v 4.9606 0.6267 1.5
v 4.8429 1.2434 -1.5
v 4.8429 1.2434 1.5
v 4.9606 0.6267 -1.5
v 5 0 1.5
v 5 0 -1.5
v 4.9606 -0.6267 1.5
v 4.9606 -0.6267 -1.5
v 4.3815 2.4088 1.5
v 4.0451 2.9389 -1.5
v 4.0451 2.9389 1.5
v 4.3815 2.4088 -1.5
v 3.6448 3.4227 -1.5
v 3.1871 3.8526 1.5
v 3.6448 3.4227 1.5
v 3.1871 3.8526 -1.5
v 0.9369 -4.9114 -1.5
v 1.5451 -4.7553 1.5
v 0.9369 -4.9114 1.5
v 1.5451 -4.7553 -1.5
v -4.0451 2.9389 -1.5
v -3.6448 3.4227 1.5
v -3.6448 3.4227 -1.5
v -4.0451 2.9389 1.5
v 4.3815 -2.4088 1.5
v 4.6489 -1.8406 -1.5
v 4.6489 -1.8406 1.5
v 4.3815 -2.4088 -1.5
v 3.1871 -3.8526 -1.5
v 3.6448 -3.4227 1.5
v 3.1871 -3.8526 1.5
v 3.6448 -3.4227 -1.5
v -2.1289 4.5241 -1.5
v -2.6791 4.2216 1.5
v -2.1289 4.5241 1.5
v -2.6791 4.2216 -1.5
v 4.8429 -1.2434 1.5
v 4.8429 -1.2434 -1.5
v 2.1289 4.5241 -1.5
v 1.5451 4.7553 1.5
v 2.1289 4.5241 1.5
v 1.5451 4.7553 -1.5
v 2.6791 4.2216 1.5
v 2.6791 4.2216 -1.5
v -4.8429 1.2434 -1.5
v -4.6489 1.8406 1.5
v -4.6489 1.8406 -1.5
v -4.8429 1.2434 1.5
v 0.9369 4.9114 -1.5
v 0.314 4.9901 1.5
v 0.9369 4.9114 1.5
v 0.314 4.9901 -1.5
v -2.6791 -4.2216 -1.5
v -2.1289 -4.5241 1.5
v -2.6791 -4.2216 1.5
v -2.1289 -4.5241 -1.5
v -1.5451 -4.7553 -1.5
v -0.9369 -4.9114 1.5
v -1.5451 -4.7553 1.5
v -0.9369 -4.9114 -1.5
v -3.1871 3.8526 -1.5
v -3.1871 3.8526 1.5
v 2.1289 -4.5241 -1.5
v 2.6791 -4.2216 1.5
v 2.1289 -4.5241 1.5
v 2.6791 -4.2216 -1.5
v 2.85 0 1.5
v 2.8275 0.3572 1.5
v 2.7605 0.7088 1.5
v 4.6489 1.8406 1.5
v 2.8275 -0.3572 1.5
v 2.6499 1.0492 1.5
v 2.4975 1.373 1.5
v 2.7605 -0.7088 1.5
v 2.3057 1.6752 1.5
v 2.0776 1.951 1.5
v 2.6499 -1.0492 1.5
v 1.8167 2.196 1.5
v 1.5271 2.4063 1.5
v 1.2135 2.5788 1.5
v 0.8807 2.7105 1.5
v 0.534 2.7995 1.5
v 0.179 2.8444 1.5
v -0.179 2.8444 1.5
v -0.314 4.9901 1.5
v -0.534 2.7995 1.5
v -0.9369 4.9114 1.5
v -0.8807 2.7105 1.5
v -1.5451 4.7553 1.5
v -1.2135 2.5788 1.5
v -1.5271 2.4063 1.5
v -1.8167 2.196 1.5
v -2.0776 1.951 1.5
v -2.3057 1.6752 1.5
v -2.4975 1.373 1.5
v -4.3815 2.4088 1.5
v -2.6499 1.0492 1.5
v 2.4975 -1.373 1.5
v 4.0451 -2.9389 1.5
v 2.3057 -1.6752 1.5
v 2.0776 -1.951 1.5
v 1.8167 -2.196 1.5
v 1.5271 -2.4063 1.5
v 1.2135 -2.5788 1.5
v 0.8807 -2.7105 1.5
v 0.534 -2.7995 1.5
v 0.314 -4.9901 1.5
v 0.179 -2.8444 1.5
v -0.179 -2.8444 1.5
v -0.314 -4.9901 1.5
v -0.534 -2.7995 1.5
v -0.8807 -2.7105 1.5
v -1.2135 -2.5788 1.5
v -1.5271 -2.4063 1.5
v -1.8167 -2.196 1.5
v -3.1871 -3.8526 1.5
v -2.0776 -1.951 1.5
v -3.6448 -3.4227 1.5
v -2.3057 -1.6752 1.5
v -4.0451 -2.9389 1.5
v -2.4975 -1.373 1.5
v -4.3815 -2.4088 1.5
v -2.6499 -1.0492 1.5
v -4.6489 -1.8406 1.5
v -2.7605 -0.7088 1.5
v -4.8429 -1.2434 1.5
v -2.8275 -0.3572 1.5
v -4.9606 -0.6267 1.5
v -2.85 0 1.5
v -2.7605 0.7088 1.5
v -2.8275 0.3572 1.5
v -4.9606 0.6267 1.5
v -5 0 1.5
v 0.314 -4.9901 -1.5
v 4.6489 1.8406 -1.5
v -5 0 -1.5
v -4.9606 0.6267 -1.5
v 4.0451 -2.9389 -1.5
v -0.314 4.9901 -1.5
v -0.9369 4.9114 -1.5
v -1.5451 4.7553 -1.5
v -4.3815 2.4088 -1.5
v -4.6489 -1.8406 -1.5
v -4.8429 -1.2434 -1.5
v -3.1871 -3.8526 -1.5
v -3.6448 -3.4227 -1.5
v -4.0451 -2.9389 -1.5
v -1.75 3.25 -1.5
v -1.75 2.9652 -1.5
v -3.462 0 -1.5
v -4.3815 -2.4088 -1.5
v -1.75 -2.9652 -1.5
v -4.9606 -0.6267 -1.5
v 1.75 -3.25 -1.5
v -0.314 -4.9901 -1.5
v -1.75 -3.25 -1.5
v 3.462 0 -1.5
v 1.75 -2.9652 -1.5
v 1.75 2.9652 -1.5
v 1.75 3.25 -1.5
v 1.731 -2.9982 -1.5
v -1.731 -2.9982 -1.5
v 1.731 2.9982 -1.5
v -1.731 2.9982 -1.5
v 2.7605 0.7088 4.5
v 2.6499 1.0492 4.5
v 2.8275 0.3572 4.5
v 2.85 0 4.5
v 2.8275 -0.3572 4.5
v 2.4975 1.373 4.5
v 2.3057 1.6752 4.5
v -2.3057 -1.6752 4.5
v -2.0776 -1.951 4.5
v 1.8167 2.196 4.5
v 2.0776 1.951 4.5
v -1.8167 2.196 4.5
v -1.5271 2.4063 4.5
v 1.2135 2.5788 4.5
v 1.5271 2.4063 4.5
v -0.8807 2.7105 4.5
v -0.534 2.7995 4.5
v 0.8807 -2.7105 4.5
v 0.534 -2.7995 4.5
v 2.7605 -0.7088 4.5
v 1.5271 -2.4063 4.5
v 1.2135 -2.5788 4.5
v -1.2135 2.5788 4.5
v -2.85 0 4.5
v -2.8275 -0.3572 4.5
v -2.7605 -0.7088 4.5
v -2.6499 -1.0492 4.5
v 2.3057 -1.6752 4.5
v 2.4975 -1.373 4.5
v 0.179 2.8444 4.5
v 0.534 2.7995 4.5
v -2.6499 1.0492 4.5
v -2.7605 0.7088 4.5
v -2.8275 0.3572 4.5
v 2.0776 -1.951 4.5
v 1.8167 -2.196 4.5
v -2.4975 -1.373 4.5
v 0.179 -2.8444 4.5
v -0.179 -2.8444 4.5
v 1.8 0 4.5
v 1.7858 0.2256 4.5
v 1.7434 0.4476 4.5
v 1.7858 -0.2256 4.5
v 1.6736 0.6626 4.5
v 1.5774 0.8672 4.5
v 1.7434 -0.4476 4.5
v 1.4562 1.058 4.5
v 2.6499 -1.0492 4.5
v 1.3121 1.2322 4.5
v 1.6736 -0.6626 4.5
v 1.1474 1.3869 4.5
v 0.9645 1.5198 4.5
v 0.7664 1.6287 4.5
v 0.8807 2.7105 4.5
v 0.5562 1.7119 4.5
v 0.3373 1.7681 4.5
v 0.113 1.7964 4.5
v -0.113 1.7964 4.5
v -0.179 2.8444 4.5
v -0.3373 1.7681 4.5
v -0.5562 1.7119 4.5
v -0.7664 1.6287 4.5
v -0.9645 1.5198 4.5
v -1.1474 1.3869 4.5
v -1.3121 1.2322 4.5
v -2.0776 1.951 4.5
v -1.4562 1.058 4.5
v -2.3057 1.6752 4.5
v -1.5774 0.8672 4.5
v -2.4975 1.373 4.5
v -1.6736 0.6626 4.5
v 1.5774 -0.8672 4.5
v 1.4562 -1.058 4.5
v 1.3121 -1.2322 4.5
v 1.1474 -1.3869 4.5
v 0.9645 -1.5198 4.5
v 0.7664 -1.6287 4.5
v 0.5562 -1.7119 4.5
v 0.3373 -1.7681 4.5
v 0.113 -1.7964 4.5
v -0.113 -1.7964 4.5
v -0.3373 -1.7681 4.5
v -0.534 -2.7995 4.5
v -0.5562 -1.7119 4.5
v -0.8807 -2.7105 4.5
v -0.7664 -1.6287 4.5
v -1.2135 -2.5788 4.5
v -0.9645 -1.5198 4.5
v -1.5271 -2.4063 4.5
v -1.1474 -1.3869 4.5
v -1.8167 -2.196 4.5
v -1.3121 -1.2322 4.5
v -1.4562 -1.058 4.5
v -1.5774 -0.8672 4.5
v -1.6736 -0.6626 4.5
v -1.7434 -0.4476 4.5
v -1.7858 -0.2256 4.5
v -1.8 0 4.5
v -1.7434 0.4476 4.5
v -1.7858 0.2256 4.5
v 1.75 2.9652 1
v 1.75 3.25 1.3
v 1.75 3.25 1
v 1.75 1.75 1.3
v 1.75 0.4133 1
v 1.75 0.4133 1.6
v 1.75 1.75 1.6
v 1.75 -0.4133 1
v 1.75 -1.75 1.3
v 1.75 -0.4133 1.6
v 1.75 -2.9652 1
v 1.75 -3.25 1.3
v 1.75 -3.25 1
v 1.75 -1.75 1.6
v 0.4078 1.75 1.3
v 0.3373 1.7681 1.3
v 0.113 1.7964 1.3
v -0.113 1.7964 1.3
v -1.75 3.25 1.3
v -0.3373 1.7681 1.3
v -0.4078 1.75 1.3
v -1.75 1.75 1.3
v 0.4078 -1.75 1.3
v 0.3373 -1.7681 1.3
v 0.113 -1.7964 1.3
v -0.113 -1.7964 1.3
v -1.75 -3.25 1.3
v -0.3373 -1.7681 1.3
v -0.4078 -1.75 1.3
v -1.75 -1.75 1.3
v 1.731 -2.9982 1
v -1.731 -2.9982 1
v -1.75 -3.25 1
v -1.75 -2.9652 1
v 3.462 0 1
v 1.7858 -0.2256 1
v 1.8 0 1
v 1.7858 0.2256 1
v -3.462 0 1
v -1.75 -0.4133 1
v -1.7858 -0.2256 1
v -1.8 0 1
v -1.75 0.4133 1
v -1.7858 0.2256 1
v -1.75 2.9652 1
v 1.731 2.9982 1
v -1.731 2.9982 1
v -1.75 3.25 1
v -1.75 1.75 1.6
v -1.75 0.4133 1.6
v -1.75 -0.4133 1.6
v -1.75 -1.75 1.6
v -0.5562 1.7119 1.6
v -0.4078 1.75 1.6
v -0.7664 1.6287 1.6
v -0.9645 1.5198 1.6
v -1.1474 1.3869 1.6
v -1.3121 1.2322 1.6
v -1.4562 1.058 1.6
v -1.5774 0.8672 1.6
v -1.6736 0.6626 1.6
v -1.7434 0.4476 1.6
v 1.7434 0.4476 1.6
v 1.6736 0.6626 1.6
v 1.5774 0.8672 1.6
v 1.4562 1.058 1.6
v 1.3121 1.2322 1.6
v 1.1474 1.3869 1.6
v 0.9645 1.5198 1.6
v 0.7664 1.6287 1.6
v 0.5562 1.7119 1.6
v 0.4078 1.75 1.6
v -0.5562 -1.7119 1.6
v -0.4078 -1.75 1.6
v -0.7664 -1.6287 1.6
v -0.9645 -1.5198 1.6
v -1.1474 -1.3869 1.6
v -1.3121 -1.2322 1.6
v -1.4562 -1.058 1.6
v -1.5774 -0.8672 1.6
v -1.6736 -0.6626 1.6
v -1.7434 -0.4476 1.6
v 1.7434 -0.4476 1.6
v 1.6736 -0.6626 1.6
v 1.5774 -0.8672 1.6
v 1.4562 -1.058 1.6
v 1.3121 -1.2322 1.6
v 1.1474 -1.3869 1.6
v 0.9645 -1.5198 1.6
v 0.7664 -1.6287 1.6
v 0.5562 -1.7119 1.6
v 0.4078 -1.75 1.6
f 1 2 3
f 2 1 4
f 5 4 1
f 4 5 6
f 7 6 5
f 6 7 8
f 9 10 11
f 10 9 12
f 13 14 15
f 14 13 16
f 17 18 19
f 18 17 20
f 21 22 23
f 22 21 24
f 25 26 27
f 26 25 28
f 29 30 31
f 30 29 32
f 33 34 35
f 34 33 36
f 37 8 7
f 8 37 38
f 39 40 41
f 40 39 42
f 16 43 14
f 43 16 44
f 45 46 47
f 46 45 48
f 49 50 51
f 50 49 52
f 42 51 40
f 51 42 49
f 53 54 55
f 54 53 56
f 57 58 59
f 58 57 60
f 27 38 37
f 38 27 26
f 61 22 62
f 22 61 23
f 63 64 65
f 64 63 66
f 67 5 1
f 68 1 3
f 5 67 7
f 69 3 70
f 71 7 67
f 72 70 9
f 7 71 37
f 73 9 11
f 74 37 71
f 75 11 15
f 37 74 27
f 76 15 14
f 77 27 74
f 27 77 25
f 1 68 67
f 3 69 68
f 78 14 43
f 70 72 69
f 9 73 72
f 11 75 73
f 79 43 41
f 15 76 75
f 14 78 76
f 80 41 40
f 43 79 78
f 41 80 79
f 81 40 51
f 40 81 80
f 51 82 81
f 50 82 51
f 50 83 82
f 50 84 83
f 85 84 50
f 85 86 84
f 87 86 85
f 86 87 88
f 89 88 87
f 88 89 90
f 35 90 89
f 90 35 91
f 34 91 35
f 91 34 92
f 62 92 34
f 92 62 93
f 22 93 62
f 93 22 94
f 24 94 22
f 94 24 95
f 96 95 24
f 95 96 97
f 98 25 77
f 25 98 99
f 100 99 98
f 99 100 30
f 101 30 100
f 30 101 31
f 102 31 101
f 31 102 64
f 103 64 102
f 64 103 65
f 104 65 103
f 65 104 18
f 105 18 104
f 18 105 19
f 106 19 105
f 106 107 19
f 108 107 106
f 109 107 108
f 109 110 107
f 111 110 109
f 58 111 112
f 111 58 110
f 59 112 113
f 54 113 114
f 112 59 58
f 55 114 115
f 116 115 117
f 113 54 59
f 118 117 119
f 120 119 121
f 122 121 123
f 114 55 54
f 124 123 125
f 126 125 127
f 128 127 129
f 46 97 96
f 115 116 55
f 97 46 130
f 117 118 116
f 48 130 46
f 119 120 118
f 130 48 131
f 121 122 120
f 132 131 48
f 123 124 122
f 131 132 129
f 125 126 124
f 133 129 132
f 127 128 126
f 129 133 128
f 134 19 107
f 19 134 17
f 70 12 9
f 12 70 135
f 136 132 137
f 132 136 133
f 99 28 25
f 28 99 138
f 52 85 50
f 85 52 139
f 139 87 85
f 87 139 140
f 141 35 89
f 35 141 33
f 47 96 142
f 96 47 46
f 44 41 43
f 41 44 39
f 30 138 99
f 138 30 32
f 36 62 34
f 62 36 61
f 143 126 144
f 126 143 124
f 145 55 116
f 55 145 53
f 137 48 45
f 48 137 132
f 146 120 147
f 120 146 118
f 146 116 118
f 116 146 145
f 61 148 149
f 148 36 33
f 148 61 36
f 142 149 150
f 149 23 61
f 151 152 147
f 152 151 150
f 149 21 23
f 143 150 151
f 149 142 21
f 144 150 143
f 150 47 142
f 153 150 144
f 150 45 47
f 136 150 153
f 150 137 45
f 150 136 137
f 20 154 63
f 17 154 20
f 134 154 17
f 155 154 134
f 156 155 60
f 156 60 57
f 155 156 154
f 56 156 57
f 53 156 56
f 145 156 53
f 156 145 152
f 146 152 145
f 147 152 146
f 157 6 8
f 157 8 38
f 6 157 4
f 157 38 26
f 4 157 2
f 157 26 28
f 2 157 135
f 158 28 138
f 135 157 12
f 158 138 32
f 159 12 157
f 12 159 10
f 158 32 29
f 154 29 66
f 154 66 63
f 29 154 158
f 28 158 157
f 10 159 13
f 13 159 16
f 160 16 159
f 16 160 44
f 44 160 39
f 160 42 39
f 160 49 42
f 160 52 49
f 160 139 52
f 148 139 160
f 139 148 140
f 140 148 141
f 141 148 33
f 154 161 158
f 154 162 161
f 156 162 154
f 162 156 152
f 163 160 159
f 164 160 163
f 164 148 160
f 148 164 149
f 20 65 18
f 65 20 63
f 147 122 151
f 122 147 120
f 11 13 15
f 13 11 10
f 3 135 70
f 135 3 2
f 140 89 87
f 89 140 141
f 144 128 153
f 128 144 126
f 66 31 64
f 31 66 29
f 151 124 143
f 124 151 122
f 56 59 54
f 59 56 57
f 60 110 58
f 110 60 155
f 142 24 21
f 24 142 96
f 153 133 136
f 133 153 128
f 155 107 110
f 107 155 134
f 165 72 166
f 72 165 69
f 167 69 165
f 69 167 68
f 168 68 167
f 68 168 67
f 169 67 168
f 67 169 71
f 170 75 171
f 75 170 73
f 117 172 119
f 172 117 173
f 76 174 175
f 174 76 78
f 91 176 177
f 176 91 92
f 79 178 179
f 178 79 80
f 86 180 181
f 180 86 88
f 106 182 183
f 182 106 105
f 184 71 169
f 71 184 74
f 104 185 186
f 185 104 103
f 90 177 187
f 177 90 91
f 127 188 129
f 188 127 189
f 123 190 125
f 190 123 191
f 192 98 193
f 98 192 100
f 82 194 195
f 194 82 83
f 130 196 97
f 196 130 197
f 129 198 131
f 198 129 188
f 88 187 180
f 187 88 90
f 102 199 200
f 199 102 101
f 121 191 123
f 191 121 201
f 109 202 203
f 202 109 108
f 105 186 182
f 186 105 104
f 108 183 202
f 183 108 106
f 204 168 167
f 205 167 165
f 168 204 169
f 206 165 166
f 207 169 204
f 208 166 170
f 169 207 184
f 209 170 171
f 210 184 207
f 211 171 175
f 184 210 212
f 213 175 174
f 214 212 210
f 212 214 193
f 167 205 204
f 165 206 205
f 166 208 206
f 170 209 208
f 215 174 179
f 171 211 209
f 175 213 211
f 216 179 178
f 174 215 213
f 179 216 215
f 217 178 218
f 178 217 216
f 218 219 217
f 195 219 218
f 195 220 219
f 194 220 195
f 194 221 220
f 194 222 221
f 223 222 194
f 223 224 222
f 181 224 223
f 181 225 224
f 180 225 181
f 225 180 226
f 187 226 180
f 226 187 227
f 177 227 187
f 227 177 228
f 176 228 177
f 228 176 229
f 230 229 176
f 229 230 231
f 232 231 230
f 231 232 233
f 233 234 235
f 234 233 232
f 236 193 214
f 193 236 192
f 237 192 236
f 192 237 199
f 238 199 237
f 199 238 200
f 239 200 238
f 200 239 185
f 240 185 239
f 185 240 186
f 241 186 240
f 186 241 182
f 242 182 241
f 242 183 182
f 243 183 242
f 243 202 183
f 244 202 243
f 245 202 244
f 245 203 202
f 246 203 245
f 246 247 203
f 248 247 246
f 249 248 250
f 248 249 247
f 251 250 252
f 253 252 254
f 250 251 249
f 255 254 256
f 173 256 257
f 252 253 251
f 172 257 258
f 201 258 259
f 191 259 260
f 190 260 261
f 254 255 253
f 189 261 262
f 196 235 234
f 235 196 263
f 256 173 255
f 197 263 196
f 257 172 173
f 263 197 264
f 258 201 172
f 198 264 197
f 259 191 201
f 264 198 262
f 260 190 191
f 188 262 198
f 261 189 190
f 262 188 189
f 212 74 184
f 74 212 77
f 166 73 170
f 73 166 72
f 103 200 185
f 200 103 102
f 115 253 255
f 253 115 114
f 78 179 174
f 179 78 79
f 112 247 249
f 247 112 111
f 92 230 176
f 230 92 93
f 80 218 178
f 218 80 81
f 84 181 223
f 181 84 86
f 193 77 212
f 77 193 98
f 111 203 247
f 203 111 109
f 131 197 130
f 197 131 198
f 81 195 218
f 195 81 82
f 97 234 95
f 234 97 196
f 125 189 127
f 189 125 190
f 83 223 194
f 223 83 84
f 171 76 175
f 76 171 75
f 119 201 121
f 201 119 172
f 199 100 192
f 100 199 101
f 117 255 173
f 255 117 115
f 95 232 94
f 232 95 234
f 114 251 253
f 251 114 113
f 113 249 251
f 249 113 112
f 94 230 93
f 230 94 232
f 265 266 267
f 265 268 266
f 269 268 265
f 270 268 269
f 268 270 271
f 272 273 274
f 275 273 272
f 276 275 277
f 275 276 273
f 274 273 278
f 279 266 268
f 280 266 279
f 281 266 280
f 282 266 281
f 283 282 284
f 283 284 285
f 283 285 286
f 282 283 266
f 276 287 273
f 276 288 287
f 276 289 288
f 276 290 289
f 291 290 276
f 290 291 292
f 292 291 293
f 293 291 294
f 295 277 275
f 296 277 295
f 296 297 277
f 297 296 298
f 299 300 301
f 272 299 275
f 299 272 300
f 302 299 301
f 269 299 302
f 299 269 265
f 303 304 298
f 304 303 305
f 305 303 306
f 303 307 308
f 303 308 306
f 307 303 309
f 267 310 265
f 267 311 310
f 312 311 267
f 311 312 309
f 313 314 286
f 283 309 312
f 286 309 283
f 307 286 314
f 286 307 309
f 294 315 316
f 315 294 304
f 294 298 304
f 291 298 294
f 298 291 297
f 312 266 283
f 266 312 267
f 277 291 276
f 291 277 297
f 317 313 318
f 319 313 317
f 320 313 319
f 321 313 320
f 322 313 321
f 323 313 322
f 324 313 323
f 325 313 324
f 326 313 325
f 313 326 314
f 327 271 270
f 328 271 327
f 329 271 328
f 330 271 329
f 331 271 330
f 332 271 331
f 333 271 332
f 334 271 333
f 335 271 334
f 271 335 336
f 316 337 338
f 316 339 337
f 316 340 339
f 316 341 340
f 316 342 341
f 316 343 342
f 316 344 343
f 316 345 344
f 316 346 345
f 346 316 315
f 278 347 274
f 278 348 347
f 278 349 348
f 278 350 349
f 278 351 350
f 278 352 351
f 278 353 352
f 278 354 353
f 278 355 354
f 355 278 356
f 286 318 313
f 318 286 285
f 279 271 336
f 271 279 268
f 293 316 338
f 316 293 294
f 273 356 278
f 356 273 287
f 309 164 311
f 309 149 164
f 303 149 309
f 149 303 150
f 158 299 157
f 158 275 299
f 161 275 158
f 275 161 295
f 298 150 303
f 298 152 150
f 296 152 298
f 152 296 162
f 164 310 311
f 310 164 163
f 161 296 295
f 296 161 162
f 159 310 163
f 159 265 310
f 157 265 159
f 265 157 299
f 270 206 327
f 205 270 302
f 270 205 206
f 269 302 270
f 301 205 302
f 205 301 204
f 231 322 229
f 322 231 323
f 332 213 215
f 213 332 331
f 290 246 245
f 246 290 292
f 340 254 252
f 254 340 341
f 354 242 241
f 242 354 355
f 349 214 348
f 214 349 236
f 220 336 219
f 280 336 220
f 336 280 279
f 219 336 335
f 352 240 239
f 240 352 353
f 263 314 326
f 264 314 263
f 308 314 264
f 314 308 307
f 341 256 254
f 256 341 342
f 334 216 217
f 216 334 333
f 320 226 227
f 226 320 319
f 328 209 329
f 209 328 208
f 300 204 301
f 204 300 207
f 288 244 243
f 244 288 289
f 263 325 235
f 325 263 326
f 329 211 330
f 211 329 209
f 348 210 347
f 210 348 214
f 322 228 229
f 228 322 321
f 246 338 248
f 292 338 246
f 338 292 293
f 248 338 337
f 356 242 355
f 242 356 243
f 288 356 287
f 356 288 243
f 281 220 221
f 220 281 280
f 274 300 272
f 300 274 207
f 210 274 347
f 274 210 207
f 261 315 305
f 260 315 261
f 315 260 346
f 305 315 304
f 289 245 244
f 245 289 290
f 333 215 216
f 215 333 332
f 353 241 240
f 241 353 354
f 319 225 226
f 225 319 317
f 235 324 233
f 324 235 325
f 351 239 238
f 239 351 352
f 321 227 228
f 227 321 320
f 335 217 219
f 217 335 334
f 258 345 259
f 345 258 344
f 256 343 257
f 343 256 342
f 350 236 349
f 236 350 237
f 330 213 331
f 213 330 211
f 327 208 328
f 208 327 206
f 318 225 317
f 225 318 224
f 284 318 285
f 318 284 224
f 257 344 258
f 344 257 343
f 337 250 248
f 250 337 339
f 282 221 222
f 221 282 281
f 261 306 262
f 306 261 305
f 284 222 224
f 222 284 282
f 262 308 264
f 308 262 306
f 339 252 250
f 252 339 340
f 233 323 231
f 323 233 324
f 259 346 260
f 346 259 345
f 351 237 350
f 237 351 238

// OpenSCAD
$fn = 50;


difference() {
	union() {
		translate(v = [0, 0, -1.5000000000]) {
			cylinder(h = 3, r = 5.0000000000);
		}
		translate(v = [0, 0, -1.5000000000]) {
			cylinder(h = 6, r = 2.8500000000);
		}
	}
	union() {
		translate(v = [0, 0, -1.5000000000]) {
			rotate(a = [0, 0, 0]) {
				difference() {
					union() {
						translate(v = [-1.7500000000, -3.2500000000, -0.3000000000]) {
							cube(size = [3.5000000000, 6.5000000000, 0.3000000000]);
						}
						translate(v = [-1.7500000000, -1.7500000000, -0.6000000000]) {
							cube(size = [3.5000000000, 3.5000000000, 0.3000000000]);
						}
						translate(v = [-1.7500000000, -3.2500000000, 2.5000000000]) {
							cube(size = [3.5000000000, 6.5000000000, 0.3000000000]);
						}
						translate(v = [-1.7500000000, -1.7500000000, 2.8000000000]) {
							cube(size = [3.5000000000, 3.5000000000, 0.3000000000]);
						}
						linear_extrude(height = 2.5000000000) {
							polygon(points = [[3.4620000000, 0.0000000000], [1.7310000000, 2.9981799479], [-1.7310000000, 2.9981799479], [-3.4620000000, 0.0000000000], [-1.7310000000, -2.9981799479], [1.7310000000, -2.9981799479]]);
						}
						translate(v = [-1.7500000000, -3.2500000000, -0.3000000000]) {
							cube(size = [3.5000000000, 6.5000000000, 0.3000000000]);
						}
						translate(v = [-1.7500000000, -1.7500000000, -0.6000000000]) {
							cube(size = [3.5000000000, 3.5000000000, 0.3000000000]);
						}
						translate(v = [-1.7500000000, -3.2500000000, 2.5000000000]) {
							cube(size = [3.5000000000, 6.5000000000, 0.3000000000]);
						}
						translate(v = [-1.7500000000, -1.7500000000, 2.8000000000]) {
							cube(size = [3.5000000000, 3.5000000000, 0.3000000000]);
						}
						translate(v = [-1.7500000000, -3.2500000000, -0.3000000000]) {
							cube(size = [3.5000000000, 6.5000000000, 0.3000000000]);
						}
						translate(v = [-1.7500000000, -1.7500000000, -0.6000000000]) {
							cube(size = [3.5000000000, 3.5000000000, 0.3000000000]);
						}
						translate(v = [-1.7500000000, -3.2500000000, 2.5000000000]) {
							cube(size = [3.5000000000, 6.5000000000, 0.3000000000]);
						}
						translate(v = [-1.7500000000, -1.7500000000, 2.8000000000]) {
							cube(size = [3.5000000000, 3.5000000000, 0.3000000000]);
						}
					}
					union();
				}
			}
		}
		translate(v = [0, 0, -100.0000000000]) {
			cylinder(h = 200, r = 1.8000000000);
		}
	}
}
